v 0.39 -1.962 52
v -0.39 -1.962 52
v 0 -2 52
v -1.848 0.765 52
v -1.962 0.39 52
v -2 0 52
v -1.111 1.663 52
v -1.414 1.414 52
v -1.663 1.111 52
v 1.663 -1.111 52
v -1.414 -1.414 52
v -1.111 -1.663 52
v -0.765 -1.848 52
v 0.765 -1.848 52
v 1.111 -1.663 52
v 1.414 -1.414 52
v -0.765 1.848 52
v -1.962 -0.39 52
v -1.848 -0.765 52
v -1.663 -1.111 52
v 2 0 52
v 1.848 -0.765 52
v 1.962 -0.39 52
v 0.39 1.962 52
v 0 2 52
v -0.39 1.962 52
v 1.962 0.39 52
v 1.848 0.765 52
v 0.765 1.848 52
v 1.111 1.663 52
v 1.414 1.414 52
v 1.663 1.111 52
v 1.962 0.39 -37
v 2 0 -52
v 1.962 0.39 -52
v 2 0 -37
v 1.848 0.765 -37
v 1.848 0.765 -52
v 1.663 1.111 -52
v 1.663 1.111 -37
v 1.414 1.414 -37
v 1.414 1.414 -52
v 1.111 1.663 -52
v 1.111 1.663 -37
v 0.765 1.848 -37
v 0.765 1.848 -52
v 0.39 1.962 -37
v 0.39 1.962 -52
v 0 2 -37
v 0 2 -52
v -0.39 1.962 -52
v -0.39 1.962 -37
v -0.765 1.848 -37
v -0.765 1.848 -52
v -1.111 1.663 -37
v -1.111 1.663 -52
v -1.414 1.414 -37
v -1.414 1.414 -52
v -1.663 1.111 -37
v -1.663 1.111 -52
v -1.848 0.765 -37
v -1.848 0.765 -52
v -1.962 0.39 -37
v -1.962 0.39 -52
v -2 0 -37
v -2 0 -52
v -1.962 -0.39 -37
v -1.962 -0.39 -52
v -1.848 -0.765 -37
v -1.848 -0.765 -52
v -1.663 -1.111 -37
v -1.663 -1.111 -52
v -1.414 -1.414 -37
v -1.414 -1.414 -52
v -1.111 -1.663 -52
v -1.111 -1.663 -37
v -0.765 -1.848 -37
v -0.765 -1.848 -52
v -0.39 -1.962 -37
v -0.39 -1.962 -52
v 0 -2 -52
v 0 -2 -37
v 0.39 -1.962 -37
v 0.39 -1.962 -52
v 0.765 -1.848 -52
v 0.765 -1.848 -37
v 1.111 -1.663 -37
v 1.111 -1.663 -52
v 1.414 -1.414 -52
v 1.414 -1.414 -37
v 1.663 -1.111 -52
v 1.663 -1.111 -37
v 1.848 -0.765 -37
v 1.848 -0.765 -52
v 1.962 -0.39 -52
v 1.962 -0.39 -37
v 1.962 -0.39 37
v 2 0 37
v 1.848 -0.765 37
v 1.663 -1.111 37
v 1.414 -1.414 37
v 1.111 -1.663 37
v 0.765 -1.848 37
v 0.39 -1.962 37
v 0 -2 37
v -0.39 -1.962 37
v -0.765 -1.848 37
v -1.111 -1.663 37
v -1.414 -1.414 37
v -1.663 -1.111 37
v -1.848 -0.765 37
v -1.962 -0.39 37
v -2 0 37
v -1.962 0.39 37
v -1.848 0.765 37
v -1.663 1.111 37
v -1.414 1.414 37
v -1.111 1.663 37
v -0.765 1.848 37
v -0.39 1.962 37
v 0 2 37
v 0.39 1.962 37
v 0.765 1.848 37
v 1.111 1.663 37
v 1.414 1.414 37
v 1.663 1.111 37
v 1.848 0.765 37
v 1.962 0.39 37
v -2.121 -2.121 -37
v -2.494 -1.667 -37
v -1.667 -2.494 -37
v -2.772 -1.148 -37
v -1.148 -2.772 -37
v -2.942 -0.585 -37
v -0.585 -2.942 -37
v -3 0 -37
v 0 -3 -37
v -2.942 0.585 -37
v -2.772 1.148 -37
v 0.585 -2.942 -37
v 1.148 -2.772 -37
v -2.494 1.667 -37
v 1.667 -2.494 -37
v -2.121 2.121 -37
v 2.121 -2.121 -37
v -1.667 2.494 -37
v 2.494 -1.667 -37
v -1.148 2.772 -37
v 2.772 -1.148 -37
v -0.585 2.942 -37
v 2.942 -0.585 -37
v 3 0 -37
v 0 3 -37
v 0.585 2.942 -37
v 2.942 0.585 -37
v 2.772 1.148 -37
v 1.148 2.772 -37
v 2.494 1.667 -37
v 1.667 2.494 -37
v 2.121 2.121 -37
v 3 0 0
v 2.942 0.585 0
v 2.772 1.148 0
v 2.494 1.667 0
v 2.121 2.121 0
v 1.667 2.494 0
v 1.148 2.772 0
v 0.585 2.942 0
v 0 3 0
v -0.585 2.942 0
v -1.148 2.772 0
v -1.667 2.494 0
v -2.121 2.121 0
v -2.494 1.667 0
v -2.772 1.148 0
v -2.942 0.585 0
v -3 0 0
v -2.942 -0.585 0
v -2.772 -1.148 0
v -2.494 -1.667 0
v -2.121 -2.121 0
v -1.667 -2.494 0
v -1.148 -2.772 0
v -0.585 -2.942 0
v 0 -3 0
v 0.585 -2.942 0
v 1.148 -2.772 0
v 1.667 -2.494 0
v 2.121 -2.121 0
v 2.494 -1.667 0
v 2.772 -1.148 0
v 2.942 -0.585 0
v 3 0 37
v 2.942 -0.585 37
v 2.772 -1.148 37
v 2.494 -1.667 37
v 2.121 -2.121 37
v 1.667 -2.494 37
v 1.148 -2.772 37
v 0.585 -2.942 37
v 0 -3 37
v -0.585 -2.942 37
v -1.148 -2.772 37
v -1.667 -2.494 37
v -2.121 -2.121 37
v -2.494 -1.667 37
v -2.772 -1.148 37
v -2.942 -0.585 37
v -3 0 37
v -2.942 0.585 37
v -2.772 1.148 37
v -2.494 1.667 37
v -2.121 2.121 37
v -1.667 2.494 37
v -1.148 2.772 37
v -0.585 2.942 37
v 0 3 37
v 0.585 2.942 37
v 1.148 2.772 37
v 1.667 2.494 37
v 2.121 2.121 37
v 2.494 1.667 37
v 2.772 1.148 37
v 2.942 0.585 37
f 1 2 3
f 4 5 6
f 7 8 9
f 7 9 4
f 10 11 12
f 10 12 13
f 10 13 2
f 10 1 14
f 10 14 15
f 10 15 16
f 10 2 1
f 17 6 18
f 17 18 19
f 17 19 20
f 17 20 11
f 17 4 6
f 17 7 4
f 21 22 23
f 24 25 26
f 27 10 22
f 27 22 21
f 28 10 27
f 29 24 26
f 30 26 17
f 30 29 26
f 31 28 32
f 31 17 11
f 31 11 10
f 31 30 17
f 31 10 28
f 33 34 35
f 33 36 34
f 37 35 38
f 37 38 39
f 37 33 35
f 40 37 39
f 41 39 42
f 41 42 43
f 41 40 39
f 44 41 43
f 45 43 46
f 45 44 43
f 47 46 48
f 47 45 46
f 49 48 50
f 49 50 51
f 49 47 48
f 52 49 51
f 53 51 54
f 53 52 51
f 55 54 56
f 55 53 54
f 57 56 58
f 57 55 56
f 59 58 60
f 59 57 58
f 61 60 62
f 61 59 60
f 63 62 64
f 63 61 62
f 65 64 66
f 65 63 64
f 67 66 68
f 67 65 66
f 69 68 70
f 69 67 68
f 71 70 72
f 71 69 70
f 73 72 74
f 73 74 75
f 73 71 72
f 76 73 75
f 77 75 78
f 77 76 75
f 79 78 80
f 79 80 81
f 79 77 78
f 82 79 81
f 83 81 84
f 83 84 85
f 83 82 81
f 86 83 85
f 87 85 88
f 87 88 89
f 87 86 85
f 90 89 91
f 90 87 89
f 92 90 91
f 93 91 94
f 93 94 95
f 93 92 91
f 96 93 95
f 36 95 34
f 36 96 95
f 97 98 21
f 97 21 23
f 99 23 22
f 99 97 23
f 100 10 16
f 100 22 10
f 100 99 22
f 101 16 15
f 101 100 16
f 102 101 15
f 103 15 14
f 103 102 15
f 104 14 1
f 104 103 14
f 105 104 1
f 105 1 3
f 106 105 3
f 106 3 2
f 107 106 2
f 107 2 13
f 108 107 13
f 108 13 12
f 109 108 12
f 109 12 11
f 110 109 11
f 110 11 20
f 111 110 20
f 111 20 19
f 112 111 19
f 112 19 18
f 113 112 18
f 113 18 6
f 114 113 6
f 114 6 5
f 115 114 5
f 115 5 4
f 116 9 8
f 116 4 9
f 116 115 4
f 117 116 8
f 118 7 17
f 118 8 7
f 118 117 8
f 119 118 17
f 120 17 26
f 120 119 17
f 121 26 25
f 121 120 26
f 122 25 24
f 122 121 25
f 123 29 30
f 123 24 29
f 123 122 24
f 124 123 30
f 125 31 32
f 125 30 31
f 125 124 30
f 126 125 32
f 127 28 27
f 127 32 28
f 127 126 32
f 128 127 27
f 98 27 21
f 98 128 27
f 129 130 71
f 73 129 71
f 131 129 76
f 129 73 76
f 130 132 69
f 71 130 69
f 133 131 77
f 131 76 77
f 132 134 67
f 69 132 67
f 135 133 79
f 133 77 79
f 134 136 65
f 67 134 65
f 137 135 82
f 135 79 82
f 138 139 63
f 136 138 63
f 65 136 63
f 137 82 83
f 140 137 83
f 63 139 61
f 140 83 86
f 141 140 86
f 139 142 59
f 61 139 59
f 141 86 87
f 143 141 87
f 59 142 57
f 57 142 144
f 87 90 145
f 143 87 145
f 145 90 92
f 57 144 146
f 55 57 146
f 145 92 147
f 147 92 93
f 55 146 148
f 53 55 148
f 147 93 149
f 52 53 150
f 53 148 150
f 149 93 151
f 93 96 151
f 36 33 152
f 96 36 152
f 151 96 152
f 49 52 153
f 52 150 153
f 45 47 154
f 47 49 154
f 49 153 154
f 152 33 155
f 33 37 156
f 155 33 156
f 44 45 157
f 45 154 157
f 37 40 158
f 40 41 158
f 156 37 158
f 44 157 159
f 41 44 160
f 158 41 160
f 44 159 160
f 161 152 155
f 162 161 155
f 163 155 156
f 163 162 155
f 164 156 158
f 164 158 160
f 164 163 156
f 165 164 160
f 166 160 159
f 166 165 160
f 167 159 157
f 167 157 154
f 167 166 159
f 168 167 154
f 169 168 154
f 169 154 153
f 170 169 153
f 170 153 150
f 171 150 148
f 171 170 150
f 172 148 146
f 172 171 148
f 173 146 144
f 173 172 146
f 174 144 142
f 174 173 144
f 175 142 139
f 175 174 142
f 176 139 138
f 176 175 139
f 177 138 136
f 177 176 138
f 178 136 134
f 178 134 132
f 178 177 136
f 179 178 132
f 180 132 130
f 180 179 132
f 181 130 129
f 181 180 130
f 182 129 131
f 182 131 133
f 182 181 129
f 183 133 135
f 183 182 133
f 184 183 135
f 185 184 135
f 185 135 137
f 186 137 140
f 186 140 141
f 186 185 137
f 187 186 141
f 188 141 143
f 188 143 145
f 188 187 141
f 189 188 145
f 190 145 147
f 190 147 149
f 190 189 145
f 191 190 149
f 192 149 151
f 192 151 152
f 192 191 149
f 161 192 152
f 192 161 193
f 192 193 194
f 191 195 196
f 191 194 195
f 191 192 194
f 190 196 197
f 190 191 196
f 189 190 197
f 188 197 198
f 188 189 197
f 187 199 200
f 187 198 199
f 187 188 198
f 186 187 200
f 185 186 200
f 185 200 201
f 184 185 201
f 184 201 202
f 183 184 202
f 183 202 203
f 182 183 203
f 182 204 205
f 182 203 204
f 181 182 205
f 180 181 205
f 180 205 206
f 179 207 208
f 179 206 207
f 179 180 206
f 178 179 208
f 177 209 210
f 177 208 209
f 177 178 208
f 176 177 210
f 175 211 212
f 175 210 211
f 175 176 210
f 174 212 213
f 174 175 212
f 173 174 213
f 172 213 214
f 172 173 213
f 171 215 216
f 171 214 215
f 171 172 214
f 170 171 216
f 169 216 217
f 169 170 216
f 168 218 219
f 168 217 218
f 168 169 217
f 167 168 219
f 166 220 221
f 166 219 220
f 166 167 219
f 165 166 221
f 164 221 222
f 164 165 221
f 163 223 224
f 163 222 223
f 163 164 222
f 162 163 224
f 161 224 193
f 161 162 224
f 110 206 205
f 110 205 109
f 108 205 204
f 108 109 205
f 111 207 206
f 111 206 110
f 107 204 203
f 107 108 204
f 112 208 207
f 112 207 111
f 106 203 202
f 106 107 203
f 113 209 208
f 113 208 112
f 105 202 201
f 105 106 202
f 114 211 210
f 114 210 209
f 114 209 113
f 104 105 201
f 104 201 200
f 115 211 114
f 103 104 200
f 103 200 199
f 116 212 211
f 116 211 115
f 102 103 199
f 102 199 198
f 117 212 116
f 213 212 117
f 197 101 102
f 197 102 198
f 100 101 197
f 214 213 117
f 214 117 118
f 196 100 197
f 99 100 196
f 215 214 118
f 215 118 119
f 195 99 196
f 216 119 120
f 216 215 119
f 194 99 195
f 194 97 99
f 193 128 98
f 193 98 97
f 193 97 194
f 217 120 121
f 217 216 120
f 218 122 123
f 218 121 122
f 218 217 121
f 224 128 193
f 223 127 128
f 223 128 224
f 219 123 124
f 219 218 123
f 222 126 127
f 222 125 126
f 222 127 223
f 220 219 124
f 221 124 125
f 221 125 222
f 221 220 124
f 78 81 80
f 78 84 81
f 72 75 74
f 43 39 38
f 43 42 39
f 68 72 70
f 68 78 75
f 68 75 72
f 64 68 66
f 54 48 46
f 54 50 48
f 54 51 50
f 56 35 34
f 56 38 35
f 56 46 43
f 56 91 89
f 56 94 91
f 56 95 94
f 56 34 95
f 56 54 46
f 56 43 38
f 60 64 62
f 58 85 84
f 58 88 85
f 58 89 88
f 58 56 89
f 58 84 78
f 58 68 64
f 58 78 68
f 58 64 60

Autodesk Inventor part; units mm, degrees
ref_plane "YZ Plane" through (0, 0, 0) normal (1, 0, 0) x (0, 1, 0)
ref_plane "XZ Plane" through (0, 0, 0) normal (0, 1, 0) x (-1, 0, 0)
ref_plane "XY Plane" through (0, 0, 0) normal (0, 0, 1) x (1, 0, 0)
sketch "Sketch1" plane through (0, 0, 0) normal (0, 0, 1) x (1, 0, 0)
  circle A0 centre (0, 0) radius 3
  dimension "d0" = 6
extrude "Extrusion1" add sketch "Sketch1" along normal mid plane 74
sketch "Sketch2" plane through (0, 0, 37) normal (0, 0, 1) x (1, 0, 0)
  circle A0 centre (0, 0) radius 3 projected
  circle A1 centre (0, 0) radius 2
  dimension "d3" = 4
extrude "Extrusion2" add sketch "Sketch2" along normal blind 15 contours A1
ref_plane "Work Plane1" through (0, 0, 0) normal (0, 0, 1) x (1, 0, 0)
mirror "Mirror1" about plane through (0, 0, 0) normal (0, 0, 1) of "Extrusion2"
ref_plane "Work Plane2" through (0, 0, 0) normal (0, 0, 1) x (1, 0, 0)
properties part number "four"
